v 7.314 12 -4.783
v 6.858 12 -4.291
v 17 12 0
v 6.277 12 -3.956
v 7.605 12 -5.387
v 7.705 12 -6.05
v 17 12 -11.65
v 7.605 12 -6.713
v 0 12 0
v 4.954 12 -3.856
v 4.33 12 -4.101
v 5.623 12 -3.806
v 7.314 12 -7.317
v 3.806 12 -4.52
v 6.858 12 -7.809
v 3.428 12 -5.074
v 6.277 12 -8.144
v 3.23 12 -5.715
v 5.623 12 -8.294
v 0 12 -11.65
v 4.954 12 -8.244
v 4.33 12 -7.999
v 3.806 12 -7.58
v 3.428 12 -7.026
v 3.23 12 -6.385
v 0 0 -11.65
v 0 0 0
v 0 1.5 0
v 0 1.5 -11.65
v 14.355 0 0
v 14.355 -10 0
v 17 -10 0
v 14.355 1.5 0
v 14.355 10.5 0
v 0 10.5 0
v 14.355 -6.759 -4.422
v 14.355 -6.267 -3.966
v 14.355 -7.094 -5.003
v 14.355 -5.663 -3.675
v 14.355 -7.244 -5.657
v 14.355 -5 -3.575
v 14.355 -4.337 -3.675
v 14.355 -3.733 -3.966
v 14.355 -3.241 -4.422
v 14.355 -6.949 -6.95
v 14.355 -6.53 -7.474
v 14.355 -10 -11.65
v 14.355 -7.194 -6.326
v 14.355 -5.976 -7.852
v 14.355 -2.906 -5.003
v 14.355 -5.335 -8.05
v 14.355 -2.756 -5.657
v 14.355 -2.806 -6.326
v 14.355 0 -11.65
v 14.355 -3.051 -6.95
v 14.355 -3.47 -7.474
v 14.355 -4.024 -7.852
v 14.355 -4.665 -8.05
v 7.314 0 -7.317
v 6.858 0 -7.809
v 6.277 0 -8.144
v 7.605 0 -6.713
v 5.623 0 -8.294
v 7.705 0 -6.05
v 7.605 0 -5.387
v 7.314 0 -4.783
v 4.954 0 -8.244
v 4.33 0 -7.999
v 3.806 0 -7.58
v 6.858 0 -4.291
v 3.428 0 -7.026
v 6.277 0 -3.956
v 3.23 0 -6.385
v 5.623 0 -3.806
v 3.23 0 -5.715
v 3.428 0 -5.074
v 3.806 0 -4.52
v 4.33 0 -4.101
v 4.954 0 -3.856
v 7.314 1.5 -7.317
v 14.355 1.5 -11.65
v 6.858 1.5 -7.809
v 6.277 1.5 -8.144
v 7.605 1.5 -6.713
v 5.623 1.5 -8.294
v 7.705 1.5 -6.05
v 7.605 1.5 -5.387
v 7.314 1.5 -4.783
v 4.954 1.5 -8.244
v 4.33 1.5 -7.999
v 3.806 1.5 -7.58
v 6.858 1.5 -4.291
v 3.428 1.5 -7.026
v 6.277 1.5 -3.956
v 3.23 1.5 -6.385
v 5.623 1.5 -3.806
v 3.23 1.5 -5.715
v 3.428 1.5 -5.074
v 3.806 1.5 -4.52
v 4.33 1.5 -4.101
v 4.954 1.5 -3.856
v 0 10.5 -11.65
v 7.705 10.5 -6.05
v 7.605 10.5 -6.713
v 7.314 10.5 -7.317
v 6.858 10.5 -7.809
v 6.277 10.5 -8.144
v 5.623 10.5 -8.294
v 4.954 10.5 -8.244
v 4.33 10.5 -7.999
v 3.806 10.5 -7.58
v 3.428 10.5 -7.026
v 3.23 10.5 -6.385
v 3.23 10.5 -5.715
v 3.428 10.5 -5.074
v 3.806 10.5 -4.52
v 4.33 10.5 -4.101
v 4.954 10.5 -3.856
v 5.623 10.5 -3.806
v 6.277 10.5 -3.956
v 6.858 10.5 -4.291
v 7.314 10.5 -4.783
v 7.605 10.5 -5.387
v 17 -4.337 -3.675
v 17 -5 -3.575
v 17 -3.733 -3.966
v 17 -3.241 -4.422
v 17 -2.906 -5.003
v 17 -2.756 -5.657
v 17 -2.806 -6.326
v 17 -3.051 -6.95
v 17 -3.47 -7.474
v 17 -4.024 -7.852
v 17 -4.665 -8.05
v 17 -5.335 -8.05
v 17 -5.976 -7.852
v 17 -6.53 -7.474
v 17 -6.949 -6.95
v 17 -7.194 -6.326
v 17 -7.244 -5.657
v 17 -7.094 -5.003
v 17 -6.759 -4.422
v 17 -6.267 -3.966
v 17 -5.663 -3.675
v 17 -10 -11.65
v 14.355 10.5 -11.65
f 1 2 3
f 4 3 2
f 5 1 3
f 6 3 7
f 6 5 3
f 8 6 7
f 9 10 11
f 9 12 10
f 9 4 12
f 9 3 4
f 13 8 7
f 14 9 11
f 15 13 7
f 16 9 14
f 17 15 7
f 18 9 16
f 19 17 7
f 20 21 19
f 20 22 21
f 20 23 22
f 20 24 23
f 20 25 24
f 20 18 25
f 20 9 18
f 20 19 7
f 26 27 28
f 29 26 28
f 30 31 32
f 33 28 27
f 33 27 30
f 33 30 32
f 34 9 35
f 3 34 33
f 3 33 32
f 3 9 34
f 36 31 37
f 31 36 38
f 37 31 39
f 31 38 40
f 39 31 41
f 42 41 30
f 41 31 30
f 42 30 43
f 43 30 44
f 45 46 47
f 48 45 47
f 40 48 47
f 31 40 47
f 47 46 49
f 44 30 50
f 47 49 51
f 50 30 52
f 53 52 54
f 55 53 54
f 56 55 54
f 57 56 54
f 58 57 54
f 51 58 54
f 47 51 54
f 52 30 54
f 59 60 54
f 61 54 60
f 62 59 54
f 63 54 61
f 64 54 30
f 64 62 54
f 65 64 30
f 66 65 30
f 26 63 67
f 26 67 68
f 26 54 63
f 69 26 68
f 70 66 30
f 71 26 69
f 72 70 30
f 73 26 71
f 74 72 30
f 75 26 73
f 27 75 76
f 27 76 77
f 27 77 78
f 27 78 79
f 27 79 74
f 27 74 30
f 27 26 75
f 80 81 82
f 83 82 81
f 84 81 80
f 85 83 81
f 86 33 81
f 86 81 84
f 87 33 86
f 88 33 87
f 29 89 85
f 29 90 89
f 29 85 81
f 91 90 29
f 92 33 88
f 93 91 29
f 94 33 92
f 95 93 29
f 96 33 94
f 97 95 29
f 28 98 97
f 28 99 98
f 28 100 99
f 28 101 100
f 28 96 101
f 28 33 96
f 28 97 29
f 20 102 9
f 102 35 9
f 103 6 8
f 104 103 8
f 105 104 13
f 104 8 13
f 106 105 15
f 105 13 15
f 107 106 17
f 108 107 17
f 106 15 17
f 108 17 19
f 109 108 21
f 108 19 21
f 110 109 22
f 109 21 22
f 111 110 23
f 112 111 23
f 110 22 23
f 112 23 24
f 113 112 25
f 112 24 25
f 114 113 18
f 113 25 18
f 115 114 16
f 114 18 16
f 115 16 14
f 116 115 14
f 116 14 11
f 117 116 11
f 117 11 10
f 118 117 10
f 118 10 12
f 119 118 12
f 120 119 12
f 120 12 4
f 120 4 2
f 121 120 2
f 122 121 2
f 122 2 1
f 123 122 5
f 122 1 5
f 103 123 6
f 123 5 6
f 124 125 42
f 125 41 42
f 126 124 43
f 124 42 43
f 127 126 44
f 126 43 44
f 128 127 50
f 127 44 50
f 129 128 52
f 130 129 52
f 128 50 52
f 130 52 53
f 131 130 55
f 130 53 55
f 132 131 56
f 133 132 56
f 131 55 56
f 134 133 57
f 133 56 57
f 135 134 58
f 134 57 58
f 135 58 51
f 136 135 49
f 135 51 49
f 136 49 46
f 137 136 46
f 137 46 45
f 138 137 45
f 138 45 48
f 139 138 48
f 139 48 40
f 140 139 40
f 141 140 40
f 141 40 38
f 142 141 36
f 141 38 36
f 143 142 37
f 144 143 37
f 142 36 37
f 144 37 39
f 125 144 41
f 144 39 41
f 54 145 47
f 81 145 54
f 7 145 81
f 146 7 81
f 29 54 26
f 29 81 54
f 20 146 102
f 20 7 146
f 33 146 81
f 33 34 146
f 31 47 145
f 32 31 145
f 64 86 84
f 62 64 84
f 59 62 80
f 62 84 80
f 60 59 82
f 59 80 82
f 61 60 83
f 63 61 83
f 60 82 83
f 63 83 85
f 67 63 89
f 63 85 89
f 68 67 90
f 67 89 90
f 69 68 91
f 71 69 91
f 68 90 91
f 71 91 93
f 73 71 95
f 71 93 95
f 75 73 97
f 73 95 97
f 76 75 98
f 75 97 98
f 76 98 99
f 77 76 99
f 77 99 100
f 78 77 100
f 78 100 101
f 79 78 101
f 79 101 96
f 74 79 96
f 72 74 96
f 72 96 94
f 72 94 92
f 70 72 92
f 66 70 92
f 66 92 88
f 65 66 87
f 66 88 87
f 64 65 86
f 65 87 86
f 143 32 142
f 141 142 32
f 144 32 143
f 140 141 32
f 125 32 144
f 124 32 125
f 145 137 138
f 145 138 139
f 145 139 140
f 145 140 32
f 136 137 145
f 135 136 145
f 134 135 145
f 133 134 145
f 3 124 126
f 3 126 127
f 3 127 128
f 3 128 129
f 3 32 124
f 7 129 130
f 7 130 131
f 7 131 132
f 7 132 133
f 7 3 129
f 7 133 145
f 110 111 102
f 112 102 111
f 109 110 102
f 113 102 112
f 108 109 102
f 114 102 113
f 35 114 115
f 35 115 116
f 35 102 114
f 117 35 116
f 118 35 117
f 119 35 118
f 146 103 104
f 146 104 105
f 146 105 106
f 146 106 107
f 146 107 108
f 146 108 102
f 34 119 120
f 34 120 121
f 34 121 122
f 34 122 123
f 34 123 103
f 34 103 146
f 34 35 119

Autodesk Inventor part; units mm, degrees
ref_plane "YZ Plane" through (0, 0, 0) normal (1, 0, 0) x (0, 1, 0)
ref_plane "XZ Plane" through (0, 0, 0) normal (0, 1, 0) x (-1, 0, 0)
ref_plane "XY Plane" through (0, 0, 0) normal (0, 0, 1) x (1, 0, 0)
sketch "Sketch1" plane through (0, 0, 0) normal (1, 0, 0) x (0, 1, 0)
  line L0 (0, 0) -> (12, 0)
  line L1 (12, 0) -> (12, -11.65)
  line L2 (12, -11.65) -> (0, -11.65)
  line L3 (0, -11.65) -> (0, 0)
  dimension "d0" = 12
  dimension "d1" = 11.65
extrude "Extrusion1" add sketch "Sketch1" along normal blind 17
sketch "Sketch3" plane through (0, 0, 0) normal (0, 0, 1) x (1, 0, 0)
  line L0 (-0.6451, 10.5) -> (14.3549, 10.5)
  line L1 (14.3549, 10.5) -> (14.3549, 1.5)
  line L2 (14.3549, 1.5) -> (-0.6451, 1.5)
  line L3 (-0.6451, 1.5) -> (-0.6451, 10.5)
  line L4 (17, 12) -> (17, 0) projected
  line L5 (0, 12) -> (17, 12) projected
  point P0 (0, 0)
  point P1 (10, 1.5)
  point P2 (10, 10.5)
  dimension "d7" = 9
  dimension "d8" = 15
  dimension "d10" = 1.5
extrude "Extrusion2" cut sketch "Sketch3" against normal blind 14
sketch "Sketch5" plane through (0, 12, 0) normal (0, 1, 0) x (1, 0, 0)
  circle A0 centre (5.4549, 6.05) radius 2.25
  line L0 (14.3549, 0) -> (14.3549, 11.65) projected
  line L1 (0, 11.65) -> (17, 11.65) projected
  point P0 (0, 0)
  point P1 (11.3549, 10)
  point P2 (14.3549, 11.65)
  dimension "d16" = 4.5
  dimension "d17" = 8.9
  dimension "d18" = 5.6
extrude "Extrusion3" cut sketch "Sketch5" against normal blind 14
sketch "Sketch6" plane through (0, 0, -11.65) normal (0, -1, 0) x (1, 0, 0)
  line L0 (14.3549, 11.65) -> (14.3549, 0) projected
  line L1 (17, 11.65) -> (17, 0) projected
  line L2 (14.3549, 11.65) -> (17, 11.65)
  line L3 (17, 11.65) -> (17, 0)
  line L4 (17, 0) -> (14.3549, 0)
  line L5 (14.3549, 0) -> (14.3549, 11.65)
  point P0 (0, 11.65)
extrude "Extrusion4" add sketch "Sketch6" along normal blind 10
sketch "Sketch7" plane through (14.3549, 0, -11.65) normal (-1, 0, 0) x (0, 0, 1)
  circle A0 centre (5.825, -5) radius 2.25
  line L0 (11.65, 0) -> (11.65, -10) projected
  line L1 (11.65, -10) -> (0, -10) projected
  dimension "d23" = 5.825
  dimension "d24" = 4.5
  dimension "d25" = 5
extrude "Extrusion5" cut sketch "Sketch7" against normal blind 4
properties part number "rodclamp1"
